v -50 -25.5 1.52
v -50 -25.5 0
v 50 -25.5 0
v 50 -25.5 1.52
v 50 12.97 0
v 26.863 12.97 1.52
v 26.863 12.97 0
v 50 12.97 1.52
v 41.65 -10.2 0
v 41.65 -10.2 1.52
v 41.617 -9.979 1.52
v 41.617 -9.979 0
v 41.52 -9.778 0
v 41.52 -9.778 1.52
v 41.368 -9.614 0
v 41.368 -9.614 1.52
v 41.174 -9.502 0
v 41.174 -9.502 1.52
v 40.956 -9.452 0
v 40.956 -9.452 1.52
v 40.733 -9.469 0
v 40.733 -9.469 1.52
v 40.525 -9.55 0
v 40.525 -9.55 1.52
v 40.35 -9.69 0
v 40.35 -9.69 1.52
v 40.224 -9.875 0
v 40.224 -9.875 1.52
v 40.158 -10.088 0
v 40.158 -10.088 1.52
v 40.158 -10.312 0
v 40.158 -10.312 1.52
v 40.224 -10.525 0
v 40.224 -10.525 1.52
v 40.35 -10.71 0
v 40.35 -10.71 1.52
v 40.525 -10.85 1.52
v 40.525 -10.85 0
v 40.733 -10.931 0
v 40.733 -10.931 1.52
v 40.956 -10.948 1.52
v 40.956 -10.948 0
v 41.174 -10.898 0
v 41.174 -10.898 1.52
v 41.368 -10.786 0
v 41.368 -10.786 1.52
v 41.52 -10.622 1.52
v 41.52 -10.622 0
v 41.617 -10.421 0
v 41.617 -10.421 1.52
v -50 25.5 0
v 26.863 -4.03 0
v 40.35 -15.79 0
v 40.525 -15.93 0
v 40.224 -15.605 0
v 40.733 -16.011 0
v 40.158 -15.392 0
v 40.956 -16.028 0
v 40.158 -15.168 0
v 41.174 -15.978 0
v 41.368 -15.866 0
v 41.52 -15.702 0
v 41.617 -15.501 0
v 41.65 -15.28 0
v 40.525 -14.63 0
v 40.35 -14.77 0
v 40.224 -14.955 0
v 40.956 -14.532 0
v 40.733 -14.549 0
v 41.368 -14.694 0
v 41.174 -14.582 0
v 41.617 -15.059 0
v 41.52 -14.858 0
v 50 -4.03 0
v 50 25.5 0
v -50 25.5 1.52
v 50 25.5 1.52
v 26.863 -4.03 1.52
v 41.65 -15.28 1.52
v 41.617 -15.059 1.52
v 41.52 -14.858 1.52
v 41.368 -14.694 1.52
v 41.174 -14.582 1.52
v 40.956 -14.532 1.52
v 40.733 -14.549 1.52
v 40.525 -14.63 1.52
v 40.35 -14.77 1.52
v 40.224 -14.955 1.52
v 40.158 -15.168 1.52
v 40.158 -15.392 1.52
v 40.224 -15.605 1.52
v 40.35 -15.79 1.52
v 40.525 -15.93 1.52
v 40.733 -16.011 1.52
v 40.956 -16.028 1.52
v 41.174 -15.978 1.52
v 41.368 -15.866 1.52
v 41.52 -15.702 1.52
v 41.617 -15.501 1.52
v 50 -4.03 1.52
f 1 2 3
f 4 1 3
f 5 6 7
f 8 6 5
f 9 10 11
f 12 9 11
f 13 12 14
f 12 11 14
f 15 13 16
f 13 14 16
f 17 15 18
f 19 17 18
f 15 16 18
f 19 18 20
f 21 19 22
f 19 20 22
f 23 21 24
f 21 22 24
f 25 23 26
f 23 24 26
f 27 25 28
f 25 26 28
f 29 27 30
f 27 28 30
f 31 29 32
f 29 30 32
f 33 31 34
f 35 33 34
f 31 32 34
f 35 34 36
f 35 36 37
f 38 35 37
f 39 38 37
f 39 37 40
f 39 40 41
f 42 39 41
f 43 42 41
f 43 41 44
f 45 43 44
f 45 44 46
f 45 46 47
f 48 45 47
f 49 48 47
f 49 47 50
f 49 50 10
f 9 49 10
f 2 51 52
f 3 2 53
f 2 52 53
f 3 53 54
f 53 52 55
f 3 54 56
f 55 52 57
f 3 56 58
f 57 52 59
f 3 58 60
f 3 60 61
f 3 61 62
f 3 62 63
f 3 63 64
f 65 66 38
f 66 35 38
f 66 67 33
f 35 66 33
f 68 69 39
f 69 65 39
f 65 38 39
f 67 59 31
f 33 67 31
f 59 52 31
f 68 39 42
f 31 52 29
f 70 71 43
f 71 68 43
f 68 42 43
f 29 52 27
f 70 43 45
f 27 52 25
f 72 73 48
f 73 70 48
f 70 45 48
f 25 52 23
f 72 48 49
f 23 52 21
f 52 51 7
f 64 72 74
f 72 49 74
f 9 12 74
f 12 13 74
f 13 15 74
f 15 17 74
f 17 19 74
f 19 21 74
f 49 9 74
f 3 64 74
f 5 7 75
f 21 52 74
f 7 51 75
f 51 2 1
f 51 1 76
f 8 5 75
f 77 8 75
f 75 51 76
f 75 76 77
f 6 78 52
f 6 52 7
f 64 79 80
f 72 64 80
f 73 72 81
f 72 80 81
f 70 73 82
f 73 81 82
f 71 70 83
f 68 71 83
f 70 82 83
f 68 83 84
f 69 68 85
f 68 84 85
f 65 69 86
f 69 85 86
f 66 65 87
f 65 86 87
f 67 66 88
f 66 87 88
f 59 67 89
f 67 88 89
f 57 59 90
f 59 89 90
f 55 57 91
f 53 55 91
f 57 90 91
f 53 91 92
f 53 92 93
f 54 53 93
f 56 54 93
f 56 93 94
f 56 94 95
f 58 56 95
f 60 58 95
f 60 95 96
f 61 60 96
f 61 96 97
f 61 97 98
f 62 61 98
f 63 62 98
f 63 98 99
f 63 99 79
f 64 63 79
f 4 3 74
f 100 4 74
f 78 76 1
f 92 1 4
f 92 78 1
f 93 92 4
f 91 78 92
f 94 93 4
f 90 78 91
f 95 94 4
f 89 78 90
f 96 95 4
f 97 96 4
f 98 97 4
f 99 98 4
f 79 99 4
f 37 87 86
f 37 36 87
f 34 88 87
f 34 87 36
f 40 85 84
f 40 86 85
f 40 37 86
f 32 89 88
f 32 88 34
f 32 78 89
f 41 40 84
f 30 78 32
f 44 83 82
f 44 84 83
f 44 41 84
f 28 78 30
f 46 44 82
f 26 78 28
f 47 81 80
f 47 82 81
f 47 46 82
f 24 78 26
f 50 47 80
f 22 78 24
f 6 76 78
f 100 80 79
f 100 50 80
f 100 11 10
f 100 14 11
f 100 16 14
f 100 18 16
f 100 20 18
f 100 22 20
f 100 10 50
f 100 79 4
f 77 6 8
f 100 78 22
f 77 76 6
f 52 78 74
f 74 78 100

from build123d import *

# Parameters (mm, degrees)
F0_W     = 100
F0_H     = 51
F1_DEPTH = 1.52
F2_W     = 23.136646
F2_H     = 17
F2_R     = 0.75
F3_DEPTH = 25


with BuildPart() as f1:
    # F0 (on Top) → F1 (new body)
    with BuildSketch(Plane.XY):
        Rectangle(F0_W, F0_H)
    extrude(amount=F1_DEPTH)

    # F2 (on face) → F3 (cut)
    with BuildSketch(Plane.XY.offset(1.52)):
        with Locations((38.431677, 4.47)):
            Rectangle(F2_W, F2_H)
        with Locations((40.9, -10.2)):
            Circle(F2_R)
        with Locations((40.9, -15.28)):
            Circle(F2_R)
    extrude(amount=-F3_DEPTH, mode=Mode.SUBTRACT)


solid = f1.part
